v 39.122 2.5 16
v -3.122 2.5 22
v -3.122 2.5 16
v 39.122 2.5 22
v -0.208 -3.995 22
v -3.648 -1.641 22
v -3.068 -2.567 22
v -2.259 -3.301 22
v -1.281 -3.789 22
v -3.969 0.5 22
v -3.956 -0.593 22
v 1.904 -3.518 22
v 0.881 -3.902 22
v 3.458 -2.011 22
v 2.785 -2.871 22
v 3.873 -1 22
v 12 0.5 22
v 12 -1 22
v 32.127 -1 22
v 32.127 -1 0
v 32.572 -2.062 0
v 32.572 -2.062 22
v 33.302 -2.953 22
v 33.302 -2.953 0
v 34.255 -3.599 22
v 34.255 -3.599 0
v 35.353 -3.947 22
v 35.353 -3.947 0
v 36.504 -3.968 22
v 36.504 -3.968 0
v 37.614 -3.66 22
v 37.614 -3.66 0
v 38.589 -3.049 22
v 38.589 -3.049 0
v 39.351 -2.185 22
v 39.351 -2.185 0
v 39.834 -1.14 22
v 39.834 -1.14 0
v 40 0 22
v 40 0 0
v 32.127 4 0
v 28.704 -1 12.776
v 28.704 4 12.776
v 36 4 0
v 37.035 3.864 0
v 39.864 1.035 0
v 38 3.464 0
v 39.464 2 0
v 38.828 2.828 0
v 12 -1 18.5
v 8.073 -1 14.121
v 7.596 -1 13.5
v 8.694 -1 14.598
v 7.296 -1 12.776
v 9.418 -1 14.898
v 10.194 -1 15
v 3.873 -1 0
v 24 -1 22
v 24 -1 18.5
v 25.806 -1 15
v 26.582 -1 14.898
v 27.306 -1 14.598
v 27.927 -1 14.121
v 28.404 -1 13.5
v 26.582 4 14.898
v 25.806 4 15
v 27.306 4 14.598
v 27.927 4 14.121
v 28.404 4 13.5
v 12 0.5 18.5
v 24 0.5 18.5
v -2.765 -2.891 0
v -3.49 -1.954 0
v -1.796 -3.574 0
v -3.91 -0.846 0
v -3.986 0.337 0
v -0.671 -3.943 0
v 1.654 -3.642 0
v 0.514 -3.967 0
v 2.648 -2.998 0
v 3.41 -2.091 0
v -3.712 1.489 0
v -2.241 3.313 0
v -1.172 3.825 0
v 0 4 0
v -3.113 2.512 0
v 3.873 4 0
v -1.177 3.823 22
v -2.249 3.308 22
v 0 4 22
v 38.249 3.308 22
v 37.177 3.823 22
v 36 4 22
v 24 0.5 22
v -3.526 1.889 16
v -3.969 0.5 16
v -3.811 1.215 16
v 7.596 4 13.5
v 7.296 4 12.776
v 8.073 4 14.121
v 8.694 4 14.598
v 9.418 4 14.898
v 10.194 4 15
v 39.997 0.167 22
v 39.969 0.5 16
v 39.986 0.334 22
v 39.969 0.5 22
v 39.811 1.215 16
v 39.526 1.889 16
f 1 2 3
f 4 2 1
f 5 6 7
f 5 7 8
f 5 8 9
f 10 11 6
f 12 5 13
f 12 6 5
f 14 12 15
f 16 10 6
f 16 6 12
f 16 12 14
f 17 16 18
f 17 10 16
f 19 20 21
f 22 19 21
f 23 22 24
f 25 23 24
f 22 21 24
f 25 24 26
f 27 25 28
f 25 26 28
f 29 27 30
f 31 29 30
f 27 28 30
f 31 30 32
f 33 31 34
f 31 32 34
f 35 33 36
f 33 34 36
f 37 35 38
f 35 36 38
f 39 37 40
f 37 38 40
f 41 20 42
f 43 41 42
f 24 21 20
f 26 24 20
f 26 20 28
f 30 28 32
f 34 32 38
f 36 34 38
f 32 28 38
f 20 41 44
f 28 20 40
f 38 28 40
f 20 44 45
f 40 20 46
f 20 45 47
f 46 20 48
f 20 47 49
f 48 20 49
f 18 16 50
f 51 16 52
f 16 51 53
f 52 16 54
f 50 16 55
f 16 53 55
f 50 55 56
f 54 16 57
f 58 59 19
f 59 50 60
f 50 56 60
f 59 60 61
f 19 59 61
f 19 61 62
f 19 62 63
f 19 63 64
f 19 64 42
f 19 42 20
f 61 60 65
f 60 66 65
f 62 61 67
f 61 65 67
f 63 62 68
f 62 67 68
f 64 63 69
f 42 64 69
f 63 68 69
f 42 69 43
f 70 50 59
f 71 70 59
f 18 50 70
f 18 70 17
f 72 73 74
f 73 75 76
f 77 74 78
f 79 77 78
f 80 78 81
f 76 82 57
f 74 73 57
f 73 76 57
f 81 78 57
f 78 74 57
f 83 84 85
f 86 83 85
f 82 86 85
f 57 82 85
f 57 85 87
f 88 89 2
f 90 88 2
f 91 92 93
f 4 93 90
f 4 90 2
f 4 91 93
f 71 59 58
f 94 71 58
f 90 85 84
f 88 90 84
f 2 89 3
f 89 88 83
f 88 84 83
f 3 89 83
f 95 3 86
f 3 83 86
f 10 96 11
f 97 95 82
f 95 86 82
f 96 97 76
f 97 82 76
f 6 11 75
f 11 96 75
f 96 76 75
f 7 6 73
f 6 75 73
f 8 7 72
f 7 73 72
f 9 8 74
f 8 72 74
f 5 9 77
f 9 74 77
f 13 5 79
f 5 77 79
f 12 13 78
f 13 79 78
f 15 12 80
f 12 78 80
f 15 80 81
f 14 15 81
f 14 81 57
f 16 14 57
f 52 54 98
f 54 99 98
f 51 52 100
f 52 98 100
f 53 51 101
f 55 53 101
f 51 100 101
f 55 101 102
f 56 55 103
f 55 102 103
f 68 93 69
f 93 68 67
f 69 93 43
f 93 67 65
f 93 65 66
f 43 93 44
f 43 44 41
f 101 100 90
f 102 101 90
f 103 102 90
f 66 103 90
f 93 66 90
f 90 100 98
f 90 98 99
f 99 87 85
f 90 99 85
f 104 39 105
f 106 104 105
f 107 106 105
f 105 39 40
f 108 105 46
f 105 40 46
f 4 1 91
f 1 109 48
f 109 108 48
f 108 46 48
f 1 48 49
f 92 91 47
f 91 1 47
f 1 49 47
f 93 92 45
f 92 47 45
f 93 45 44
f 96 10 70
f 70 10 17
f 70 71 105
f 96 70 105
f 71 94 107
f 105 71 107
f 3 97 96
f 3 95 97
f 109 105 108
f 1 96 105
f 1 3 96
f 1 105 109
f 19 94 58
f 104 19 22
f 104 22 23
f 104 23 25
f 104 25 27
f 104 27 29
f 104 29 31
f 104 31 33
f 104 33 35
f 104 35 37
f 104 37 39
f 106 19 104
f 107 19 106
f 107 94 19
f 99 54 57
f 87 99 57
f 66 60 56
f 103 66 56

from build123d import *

# Parameters (mm, degrees)
F1_DEPTH = 22
F2_W     = 44
F2_H     = 2
F3_DEPTH = 6
F5_DEPTH = 5
F6_W     = 12
F6_H     = 3.5
F7_DEPTH = 3.5
F8_R     = 3


with BuildPart() as f1:
    # F0 (on Top) → F1 (new body)
    with BuildSketch(Plane.XY):
        with BuildLine():
            ThreePointArc((3.872983, -1), (3.968119, -0.504017), (4, 0))
            ThreePointArc((4, 0), (2.828427, 2.828427), (0, 4))
            ThreePointArc((0, 4), (-3.162278, -2.44949), (3.872983, -1))
        make_face()
        with BuildLine():
            ThreePointArc((0, 4), (2.828427, 2.828427), (4, 0))
            ThreePointArc((4, 0), (3.968119, -0.504017), (3.872983, -1))
            Line((3.872983, -1), (32.127017, -1))
            ThreePointArc((32.127017, -1), (32.837722, 2.44949), (36, 4))
            Line((36, 4), (0, 4))
        make_face()
        with BuildLine():
            ThreePointArc((40, 0), (38.828427, 2.828427), (36, 4))
            ThreePointArc((36, 4), (32.837722, 2.44949), (32.127017, -1))
            ThreePointArc((32.127017, -1), (36.504017, -3.968119), (40, 0))
        make_face()
    extrude(amount=F1_DEPTH)

    # F2 (on face) → F3 (cut)
    with BuildSketch(Plane.XY.offset(22)):
        with Locations((18, 1.5)):
            Rectangle(F2_W, F2_H)
    extrude(amount=-F3_DEPTH, mode=Mode.SUBTRACT)

    # F4 (on face) → F5 (cut, through all)
    with BuildSketch(Plane.XZ.offset(1)):
        Polygon((7.892221, 15), (3.872983, 0), (32.127017, 0), (28.107779, 15), (18, 15), align=None)
    extrude(amount=-F5_DEPTH, mode=Mode.SUBTRACT)

    # F6 (on face) → F7 (cut)
    with BuildSketch(Plane.XZ.offset(1)):
        with Locations((18, 20.25)):
            Rectangle(F6_W, F6_H)
    extrude(amount=-F7_DEPTH, mode=Mode.SUBTRACT)

    # F8
    f8_edges = [f1.edges().sort_by_distance(p)[0] for p in [
        (7.892221, 1.5, 15),
        (28.107779, 1.5, 15),
    ]]
    fillet(f8_edges, radius=F8_R)


solid = f1.part
